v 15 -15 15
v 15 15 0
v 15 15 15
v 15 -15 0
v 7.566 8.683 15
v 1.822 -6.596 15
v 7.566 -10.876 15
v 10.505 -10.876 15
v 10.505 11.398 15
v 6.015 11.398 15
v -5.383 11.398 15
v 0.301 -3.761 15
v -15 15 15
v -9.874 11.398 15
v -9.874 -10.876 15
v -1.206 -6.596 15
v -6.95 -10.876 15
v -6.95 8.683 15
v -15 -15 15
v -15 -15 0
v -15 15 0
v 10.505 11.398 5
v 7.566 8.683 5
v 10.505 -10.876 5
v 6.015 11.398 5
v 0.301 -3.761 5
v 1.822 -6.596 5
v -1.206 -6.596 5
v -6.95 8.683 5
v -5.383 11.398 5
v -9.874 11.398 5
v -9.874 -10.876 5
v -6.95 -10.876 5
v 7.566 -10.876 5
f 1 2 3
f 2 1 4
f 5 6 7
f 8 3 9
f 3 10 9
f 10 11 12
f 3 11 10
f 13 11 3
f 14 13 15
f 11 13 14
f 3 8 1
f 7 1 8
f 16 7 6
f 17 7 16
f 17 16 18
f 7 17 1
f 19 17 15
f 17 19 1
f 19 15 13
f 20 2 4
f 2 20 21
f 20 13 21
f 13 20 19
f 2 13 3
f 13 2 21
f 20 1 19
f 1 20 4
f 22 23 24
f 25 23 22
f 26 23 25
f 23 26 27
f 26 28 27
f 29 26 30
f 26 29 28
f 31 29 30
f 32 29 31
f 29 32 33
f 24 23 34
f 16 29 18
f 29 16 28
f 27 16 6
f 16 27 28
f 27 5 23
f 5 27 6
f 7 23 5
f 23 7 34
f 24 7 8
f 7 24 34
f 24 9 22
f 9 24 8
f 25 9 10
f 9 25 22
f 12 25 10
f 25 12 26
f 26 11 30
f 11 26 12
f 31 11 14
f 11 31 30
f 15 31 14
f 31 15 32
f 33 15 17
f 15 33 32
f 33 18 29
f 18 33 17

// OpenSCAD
// LetterBlock.scad - Basic usage of text() and linear_extrude()

// Module instantiation
LetterBlock("M");

// Module definition.
// size=30 defines an optional parameter with a default value.
module LetterBlock(letter, size=30) {
    difference() {
        translate([0,0,size/4]) cube([size,size,size/2], center=true);
        translate([0,0,size/6]) {
            // convexity is needed for correct preview
            // since characters can be highly concave
            linear_extrude(height=size, convexity=4)
                text(letter, 
                     size=size*22/30,
                     font="Tahoma",
                     halign="center",
                     valign="center");
        }
    }
}

echo(version=version());
// Written by Marius Kintel &ltmarius@kintel.net>
//
// To the extent possible under law, the author(s) have dedicated all
// copyright and related and neighboring rights to this software to the
// public domain worldwide. This software is distributed without any
// warranty.
//
// You should have received a copy of the CC0 Public Domain
// Dedication along with this software.
// If not, see &lthttp://creativecommons.org/publicdomain/zero/1.0/&gt.
